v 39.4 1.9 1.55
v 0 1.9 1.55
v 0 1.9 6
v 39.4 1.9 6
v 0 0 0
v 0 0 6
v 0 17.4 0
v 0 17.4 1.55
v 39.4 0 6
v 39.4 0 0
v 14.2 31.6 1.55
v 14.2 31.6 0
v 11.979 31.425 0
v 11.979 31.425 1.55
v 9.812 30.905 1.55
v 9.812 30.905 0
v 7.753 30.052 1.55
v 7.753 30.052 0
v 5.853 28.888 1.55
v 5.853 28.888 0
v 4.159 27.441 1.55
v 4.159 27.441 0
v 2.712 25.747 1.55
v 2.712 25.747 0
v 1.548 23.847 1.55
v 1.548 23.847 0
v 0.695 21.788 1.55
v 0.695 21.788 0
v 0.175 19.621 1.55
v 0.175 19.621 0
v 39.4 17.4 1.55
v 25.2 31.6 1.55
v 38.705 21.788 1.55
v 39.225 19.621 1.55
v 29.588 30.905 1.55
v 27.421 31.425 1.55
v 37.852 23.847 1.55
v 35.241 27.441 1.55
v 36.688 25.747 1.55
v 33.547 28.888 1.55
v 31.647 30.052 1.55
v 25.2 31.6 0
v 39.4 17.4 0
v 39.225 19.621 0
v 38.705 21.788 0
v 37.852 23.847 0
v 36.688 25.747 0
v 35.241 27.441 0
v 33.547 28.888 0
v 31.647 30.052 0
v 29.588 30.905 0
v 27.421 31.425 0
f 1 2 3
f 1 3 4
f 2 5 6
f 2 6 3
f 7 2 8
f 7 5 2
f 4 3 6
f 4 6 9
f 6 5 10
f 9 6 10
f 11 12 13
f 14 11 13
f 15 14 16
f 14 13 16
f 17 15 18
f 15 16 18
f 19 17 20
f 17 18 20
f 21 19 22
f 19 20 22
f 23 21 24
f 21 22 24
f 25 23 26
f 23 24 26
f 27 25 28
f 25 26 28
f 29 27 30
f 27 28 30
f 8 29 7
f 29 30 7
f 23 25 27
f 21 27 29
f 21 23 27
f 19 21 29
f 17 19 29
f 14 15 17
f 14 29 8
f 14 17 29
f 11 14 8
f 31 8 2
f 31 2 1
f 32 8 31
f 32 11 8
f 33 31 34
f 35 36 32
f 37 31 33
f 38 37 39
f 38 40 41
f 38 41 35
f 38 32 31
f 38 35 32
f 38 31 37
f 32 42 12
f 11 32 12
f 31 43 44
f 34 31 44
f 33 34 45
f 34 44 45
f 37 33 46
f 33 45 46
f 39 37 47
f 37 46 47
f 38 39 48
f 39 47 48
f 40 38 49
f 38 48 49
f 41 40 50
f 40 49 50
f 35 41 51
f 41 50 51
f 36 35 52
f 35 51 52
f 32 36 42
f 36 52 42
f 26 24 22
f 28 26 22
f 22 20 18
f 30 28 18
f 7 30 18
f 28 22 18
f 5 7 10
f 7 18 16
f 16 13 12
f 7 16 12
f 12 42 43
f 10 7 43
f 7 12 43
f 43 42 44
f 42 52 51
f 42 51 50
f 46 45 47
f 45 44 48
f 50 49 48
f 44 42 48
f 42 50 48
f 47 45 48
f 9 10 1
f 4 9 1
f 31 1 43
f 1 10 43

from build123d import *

# Parameters (mm, degrees)
F1_DEPTH = 1.55
F0_W     = 39.4
F0_H     = 1.9
F2_DEPTH = 6


with BuildPart() as f1:
    # F0 (on Top) → F1 (new body)
    with BuildSketch(Plane.XY):
        with BuildLine():
            Line((0, 17.4), (0, 1.9))
            Line((0, 1.9), (39.4, 1.9))
            Line((39.4, 1.9), (39.4, 17.4))
            ThreePointArc((39.4, 17.4), (35.240916, 27.440916), (25.2, 31.6))
            Line((25.2, 31.6), (14.2, 31.6))
            ThreePointArc((14.2, 31.6), (4.159084, 27.440916), (0, 17.4))
        make_face()
    extrude(amount=F1_DEPTH)

    # F0 (on Top) → F2 (join)
    with BuildSketch(Plane.XY):
        with Locations((19.7, 0.95)):
            Rectangle(F0_W, F0_H)
    extrude(amount=F2_DEPTH)


solid = f1.part
